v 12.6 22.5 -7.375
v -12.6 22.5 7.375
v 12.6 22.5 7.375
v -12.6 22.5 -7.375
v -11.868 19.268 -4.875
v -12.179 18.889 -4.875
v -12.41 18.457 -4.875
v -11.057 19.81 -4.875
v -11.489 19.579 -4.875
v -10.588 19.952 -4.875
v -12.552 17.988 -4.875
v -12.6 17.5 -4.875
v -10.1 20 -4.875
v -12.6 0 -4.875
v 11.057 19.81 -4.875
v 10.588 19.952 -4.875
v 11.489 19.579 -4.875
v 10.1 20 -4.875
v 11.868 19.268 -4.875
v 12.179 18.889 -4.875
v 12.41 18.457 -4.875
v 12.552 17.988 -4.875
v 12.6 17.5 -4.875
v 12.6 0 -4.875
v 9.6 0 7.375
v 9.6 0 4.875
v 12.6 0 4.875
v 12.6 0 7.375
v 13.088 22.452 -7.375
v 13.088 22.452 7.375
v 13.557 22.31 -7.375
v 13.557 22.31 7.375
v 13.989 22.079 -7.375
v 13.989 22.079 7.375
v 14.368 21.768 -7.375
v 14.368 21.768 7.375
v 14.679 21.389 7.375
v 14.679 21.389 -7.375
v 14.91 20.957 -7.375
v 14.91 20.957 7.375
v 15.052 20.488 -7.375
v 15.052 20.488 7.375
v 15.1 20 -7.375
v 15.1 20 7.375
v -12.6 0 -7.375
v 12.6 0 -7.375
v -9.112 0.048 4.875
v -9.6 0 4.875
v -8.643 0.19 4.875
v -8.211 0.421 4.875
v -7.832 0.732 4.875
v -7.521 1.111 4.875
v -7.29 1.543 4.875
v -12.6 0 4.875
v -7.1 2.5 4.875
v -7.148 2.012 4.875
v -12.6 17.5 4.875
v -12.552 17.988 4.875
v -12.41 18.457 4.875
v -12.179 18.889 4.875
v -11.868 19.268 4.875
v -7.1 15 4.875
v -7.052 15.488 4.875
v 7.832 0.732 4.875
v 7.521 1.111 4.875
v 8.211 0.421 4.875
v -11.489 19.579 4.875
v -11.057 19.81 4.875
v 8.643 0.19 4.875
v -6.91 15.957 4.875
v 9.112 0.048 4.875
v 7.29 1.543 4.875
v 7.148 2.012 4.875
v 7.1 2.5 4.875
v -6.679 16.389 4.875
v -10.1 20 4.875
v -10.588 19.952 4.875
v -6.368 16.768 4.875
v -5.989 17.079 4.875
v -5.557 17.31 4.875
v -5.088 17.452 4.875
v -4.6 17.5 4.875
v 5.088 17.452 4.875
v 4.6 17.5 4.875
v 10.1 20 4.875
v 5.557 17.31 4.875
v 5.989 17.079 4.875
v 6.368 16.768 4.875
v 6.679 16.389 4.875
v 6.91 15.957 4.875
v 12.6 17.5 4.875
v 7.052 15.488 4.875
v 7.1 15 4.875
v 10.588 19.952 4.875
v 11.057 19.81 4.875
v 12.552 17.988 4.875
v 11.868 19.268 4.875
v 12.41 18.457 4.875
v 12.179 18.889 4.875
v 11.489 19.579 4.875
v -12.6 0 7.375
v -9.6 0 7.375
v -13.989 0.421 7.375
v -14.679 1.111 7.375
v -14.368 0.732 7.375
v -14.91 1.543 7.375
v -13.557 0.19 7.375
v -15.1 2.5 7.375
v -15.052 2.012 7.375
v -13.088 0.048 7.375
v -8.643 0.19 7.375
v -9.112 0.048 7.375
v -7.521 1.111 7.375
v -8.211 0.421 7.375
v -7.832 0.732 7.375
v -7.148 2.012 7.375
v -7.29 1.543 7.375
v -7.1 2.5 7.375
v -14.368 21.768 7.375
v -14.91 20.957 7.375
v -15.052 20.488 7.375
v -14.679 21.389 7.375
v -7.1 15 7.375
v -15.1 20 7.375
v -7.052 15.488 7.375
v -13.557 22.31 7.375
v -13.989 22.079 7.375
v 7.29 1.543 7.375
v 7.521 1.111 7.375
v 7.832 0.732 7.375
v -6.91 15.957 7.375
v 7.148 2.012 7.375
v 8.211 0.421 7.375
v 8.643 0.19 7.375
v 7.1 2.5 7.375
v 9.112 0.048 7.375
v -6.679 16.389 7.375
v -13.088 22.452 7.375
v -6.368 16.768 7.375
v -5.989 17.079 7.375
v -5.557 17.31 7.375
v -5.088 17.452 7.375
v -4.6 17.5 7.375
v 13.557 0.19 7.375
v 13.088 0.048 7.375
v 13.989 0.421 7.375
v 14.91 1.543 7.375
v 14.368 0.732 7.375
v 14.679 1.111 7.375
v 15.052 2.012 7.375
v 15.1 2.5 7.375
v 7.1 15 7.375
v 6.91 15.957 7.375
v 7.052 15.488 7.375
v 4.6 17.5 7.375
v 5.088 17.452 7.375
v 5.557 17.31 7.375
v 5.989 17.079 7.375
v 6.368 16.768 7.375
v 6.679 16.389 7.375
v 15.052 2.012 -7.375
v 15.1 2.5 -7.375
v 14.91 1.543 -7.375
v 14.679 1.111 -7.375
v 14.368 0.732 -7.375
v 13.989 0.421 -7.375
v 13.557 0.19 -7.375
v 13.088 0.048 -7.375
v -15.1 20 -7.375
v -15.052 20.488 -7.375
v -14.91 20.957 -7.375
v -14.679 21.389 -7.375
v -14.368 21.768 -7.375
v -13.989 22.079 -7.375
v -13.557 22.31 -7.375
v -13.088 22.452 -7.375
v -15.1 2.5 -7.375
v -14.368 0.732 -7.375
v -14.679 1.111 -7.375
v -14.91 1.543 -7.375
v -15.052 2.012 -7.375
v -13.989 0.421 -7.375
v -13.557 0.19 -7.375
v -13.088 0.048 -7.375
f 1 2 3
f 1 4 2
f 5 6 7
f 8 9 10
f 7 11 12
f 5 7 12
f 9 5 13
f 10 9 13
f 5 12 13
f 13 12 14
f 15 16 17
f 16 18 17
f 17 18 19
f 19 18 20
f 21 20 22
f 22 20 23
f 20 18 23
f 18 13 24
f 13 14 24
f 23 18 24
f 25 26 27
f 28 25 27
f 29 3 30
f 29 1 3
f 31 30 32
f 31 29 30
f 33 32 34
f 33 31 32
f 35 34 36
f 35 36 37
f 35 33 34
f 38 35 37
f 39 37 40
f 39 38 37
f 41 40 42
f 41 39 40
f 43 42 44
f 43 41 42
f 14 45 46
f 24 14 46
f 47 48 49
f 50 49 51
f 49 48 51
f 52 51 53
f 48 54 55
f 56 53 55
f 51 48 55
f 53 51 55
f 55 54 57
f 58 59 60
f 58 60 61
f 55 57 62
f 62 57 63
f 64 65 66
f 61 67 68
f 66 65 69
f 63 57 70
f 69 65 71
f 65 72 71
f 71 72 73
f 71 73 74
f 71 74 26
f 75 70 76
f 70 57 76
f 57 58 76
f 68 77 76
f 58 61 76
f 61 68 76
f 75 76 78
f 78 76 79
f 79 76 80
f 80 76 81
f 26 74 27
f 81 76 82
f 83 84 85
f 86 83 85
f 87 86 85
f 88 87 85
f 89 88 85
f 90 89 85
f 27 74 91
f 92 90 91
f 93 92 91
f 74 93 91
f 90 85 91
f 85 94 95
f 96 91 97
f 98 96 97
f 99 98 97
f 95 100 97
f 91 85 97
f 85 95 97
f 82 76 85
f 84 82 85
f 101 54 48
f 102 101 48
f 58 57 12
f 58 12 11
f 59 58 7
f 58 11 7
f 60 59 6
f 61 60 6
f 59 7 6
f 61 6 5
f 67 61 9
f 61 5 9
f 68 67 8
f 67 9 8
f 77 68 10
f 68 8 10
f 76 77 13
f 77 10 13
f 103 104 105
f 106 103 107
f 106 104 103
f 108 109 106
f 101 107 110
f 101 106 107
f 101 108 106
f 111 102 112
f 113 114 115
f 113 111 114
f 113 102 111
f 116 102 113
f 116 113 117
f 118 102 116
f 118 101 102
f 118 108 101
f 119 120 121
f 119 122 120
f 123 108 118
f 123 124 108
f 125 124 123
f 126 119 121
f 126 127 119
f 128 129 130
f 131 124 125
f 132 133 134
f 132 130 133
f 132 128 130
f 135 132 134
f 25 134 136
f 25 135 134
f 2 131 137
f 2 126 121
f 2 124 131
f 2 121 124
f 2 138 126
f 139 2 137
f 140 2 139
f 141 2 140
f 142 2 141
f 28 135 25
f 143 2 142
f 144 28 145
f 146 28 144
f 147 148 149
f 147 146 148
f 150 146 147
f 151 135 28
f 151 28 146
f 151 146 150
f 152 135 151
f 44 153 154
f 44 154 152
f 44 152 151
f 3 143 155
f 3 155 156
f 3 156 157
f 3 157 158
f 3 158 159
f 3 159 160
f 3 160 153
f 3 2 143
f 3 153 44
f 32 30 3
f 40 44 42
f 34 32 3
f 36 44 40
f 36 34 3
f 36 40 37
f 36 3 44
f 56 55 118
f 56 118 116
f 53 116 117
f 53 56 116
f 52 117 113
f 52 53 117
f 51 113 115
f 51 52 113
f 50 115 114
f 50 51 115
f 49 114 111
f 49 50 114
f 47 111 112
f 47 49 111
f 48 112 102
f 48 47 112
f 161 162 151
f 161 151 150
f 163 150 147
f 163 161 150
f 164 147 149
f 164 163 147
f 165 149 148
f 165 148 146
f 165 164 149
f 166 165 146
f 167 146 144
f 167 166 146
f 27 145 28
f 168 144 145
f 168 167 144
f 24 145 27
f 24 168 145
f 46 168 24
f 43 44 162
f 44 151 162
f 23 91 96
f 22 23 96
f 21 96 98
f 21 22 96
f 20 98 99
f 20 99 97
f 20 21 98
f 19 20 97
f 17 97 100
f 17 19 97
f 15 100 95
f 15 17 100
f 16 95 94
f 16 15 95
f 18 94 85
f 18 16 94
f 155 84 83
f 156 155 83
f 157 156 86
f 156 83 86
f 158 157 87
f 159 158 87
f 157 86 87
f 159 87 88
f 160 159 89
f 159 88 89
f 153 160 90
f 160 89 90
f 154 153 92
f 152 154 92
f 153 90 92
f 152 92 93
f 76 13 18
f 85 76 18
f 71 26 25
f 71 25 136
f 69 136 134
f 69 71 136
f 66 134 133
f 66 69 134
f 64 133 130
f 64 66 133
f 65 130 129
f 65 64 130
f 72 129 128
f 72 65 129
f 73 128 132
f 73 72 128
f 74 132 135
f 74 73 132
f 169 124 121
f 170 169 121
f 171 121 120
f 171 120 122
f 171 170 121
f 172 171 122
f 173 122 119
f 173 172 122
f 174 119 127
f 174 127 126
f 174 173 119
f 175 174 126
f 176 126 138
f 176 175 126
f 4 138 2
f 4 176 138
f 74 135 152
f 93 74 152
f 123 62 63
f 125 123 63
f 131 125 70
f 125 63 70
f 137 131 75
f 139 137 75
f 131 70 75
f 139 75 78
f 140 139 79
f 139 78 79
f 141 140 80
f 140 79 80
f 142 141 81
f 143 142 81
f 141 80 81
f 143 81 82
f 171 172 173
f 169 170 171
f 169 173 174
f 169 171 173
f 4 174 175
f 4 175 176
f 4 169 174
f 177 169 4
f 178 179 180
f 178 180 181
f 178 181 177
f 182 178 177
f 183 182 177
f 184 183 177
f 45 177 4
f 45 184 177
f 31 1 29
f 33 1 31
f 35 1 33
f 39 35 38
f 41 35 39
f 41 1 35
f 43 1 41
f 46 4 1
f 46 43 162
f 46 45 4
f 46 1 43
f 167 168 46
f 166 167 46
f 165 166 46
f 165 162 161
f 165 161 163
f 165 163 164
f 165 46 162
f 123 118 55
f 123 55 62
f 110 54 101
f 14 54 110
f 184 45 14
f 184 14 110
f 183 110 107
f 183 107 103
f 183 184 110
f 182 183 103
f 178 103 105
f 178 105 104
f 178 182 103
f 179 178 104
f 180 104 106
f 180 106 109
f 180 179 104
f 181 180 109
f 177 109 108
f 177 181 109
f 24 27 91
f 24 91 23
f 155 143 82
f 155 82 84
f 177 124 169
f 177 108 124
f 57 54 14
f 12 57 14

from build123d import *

# Parameters (mm, degrees)
SKETCH1_W           = 30.2
SKETCH1_H           = 14.75
SKETCH1_W_2         = 25.2
SKETCH1_H_2         = 9.75
BOSS_EXTRUDE1_DEPTH = 20
SKETCH2_W           = 30.2
SKETCH2_H           = 14.75
BOSS_EXTRUDE2_DEPTH = 2.5
SKETCH3_W           = 14.2
SKETCH3_H           = 17.5
CUT_EXTRUDE1_DEPTH  = 2.5
FILLET1_R           = 2.5
FILLET2_R           = 2.5
FILLET3_START       = -8
FILLET3_DEPTH       = 16
FILLET3_START_2     = 4.875
FILLET3_2_DEPTH     = 3.125
FILLET3_3_DEPTH     = 2.5


with BuildPart() as part:
    # Sketch1 → Boss-Extrude1 (new body)
    with BuildSketch(Plane(origin=(0, 0, 0), x_dir=(1, 0, 0), z_dir=(0, 1, 0))):
        Rectangle(SKETCH1_W, SKETCH1_H)
        Rectangle(SKETCH1_W_2, SKETCH1_H_2, mode=Mode.SUBTRACT)
    extrude(amount=BOSS_EXTRUDE1_DEPTH)

    # Sketch2 → Boss-Extrude2 (add)
    with BuildSketch(Plane(origin=(0, 20, 0), x_dir=(1, 0, 0), z_dir=(0, 1, 0))):
        Rectangle(SKETCH2_W, SKETCH2_H)
    extrude(amount=BOSS_EXTRUDE2_DEPTH)

    # Sketch3 → Cut-Extrude1 (cut)
    with BuildSketch(Plane.XY.offset(7.375)):
        with Locations((0, 8.75)):
            Rectangle(SKETCH3_W, SKETCH3_H)
    extrude(amount=-CUT_EXTRUDE1_DEPTH, mode=Mode.SUBTRACT)

    # Fillet1
    fillet1_edges = [part.edges().sort_by_distance(p)[0] for p in [
        (-15.1, 22.5, 0),
        (15.1, 22.5, 0),
    ]]
    fillet(fillet1_edges, radius=FILLET1_R)

    # Fillet2
    fillet2_edges = [part.edges().sort_by_distance(p)[0] for p in [
        (12.6, 20, 0),
        (-12.6, 20, 0),
    ]]
    fillet(fillet2_edges, radius=FILLET2_R)

    # Fillet3: read off the stored shape, not the designer's step
    # Fillet3 outline → Fillet3 (cut)
    with BuildSketch(Plane.XY.offset(FILLET3_START)):
        with BuildLine():
            Line((-15.1, 0), (-12.6, 0))
            ThreePointArc((-12.6, 0), (-14.367766953, 0.732233047), (-15.1, 2.5))
            Line((-15.1, 2.5), (-15.1, 0))
        make_face()
        with BuildLine():
            ThreePointArc((15.1, 2.5), (14.367766953, 0.732233047), (12.6, 0))
            Line((12.6, 0), (15.1, 0))
            Line((15.1, 0), (15.1, 2.5))
        make_face()
    extrude(amount=FILLET3_DEPTH, mode=Mode.SUBTRACT)

    # Fillet3 2 outline → Fillet3 2 (cut)
    with BuildSketch(Plane.XY.offset(FILLET3_START_2)):
        with BuildLine():
            ThreePointArc((-7.1, 2.5), (-7.832233047, 0.732233047), (-9.6, 0))
            Line((-9.6, 0), (-7.1, 0))
            Line((-7.1, 0), (-7.1, 2.5))
        make_face()
        with BuildLine():
            Line((7.1, 2.5), (7.1, 0))
            Line((7.1, 0), (9.6, 0))
            ThreePointArc((9.6, 0), (7.832233047, 0.732233047), (7.1, 2.5))
        make_face()
    extrude(amount=FILLET3_2_DEPTH, mode=Mode.SUBTRACT)

    # Fillet3 3 outline → Fillet3 3 (add)
    with BuildSketch(Plane.XY.offset(FILLET3_START_2)):
        with BuildLine():
            Line((-7.1, 17.5), (-7.1, 15))
            ThreePointArc((-7.1, 15), (-6.367766953, 16.767766953), (-4.6, 17.5))
            Line((-4.6, 17.5), (-7.1, 17.5))
        make_face()
        with BuildLine():
            Line((7.1, 17.5), (4.6, 17.5))
            ThreePointArc((4.6, 17.5), (6.367766953, 16.767766953), (7.1, 15))
            Line((7.1, 15), (7.1, 17.5))
        make_face()
    extrude(amount=FILLET3_3_DEPTH)


solid = part.part
